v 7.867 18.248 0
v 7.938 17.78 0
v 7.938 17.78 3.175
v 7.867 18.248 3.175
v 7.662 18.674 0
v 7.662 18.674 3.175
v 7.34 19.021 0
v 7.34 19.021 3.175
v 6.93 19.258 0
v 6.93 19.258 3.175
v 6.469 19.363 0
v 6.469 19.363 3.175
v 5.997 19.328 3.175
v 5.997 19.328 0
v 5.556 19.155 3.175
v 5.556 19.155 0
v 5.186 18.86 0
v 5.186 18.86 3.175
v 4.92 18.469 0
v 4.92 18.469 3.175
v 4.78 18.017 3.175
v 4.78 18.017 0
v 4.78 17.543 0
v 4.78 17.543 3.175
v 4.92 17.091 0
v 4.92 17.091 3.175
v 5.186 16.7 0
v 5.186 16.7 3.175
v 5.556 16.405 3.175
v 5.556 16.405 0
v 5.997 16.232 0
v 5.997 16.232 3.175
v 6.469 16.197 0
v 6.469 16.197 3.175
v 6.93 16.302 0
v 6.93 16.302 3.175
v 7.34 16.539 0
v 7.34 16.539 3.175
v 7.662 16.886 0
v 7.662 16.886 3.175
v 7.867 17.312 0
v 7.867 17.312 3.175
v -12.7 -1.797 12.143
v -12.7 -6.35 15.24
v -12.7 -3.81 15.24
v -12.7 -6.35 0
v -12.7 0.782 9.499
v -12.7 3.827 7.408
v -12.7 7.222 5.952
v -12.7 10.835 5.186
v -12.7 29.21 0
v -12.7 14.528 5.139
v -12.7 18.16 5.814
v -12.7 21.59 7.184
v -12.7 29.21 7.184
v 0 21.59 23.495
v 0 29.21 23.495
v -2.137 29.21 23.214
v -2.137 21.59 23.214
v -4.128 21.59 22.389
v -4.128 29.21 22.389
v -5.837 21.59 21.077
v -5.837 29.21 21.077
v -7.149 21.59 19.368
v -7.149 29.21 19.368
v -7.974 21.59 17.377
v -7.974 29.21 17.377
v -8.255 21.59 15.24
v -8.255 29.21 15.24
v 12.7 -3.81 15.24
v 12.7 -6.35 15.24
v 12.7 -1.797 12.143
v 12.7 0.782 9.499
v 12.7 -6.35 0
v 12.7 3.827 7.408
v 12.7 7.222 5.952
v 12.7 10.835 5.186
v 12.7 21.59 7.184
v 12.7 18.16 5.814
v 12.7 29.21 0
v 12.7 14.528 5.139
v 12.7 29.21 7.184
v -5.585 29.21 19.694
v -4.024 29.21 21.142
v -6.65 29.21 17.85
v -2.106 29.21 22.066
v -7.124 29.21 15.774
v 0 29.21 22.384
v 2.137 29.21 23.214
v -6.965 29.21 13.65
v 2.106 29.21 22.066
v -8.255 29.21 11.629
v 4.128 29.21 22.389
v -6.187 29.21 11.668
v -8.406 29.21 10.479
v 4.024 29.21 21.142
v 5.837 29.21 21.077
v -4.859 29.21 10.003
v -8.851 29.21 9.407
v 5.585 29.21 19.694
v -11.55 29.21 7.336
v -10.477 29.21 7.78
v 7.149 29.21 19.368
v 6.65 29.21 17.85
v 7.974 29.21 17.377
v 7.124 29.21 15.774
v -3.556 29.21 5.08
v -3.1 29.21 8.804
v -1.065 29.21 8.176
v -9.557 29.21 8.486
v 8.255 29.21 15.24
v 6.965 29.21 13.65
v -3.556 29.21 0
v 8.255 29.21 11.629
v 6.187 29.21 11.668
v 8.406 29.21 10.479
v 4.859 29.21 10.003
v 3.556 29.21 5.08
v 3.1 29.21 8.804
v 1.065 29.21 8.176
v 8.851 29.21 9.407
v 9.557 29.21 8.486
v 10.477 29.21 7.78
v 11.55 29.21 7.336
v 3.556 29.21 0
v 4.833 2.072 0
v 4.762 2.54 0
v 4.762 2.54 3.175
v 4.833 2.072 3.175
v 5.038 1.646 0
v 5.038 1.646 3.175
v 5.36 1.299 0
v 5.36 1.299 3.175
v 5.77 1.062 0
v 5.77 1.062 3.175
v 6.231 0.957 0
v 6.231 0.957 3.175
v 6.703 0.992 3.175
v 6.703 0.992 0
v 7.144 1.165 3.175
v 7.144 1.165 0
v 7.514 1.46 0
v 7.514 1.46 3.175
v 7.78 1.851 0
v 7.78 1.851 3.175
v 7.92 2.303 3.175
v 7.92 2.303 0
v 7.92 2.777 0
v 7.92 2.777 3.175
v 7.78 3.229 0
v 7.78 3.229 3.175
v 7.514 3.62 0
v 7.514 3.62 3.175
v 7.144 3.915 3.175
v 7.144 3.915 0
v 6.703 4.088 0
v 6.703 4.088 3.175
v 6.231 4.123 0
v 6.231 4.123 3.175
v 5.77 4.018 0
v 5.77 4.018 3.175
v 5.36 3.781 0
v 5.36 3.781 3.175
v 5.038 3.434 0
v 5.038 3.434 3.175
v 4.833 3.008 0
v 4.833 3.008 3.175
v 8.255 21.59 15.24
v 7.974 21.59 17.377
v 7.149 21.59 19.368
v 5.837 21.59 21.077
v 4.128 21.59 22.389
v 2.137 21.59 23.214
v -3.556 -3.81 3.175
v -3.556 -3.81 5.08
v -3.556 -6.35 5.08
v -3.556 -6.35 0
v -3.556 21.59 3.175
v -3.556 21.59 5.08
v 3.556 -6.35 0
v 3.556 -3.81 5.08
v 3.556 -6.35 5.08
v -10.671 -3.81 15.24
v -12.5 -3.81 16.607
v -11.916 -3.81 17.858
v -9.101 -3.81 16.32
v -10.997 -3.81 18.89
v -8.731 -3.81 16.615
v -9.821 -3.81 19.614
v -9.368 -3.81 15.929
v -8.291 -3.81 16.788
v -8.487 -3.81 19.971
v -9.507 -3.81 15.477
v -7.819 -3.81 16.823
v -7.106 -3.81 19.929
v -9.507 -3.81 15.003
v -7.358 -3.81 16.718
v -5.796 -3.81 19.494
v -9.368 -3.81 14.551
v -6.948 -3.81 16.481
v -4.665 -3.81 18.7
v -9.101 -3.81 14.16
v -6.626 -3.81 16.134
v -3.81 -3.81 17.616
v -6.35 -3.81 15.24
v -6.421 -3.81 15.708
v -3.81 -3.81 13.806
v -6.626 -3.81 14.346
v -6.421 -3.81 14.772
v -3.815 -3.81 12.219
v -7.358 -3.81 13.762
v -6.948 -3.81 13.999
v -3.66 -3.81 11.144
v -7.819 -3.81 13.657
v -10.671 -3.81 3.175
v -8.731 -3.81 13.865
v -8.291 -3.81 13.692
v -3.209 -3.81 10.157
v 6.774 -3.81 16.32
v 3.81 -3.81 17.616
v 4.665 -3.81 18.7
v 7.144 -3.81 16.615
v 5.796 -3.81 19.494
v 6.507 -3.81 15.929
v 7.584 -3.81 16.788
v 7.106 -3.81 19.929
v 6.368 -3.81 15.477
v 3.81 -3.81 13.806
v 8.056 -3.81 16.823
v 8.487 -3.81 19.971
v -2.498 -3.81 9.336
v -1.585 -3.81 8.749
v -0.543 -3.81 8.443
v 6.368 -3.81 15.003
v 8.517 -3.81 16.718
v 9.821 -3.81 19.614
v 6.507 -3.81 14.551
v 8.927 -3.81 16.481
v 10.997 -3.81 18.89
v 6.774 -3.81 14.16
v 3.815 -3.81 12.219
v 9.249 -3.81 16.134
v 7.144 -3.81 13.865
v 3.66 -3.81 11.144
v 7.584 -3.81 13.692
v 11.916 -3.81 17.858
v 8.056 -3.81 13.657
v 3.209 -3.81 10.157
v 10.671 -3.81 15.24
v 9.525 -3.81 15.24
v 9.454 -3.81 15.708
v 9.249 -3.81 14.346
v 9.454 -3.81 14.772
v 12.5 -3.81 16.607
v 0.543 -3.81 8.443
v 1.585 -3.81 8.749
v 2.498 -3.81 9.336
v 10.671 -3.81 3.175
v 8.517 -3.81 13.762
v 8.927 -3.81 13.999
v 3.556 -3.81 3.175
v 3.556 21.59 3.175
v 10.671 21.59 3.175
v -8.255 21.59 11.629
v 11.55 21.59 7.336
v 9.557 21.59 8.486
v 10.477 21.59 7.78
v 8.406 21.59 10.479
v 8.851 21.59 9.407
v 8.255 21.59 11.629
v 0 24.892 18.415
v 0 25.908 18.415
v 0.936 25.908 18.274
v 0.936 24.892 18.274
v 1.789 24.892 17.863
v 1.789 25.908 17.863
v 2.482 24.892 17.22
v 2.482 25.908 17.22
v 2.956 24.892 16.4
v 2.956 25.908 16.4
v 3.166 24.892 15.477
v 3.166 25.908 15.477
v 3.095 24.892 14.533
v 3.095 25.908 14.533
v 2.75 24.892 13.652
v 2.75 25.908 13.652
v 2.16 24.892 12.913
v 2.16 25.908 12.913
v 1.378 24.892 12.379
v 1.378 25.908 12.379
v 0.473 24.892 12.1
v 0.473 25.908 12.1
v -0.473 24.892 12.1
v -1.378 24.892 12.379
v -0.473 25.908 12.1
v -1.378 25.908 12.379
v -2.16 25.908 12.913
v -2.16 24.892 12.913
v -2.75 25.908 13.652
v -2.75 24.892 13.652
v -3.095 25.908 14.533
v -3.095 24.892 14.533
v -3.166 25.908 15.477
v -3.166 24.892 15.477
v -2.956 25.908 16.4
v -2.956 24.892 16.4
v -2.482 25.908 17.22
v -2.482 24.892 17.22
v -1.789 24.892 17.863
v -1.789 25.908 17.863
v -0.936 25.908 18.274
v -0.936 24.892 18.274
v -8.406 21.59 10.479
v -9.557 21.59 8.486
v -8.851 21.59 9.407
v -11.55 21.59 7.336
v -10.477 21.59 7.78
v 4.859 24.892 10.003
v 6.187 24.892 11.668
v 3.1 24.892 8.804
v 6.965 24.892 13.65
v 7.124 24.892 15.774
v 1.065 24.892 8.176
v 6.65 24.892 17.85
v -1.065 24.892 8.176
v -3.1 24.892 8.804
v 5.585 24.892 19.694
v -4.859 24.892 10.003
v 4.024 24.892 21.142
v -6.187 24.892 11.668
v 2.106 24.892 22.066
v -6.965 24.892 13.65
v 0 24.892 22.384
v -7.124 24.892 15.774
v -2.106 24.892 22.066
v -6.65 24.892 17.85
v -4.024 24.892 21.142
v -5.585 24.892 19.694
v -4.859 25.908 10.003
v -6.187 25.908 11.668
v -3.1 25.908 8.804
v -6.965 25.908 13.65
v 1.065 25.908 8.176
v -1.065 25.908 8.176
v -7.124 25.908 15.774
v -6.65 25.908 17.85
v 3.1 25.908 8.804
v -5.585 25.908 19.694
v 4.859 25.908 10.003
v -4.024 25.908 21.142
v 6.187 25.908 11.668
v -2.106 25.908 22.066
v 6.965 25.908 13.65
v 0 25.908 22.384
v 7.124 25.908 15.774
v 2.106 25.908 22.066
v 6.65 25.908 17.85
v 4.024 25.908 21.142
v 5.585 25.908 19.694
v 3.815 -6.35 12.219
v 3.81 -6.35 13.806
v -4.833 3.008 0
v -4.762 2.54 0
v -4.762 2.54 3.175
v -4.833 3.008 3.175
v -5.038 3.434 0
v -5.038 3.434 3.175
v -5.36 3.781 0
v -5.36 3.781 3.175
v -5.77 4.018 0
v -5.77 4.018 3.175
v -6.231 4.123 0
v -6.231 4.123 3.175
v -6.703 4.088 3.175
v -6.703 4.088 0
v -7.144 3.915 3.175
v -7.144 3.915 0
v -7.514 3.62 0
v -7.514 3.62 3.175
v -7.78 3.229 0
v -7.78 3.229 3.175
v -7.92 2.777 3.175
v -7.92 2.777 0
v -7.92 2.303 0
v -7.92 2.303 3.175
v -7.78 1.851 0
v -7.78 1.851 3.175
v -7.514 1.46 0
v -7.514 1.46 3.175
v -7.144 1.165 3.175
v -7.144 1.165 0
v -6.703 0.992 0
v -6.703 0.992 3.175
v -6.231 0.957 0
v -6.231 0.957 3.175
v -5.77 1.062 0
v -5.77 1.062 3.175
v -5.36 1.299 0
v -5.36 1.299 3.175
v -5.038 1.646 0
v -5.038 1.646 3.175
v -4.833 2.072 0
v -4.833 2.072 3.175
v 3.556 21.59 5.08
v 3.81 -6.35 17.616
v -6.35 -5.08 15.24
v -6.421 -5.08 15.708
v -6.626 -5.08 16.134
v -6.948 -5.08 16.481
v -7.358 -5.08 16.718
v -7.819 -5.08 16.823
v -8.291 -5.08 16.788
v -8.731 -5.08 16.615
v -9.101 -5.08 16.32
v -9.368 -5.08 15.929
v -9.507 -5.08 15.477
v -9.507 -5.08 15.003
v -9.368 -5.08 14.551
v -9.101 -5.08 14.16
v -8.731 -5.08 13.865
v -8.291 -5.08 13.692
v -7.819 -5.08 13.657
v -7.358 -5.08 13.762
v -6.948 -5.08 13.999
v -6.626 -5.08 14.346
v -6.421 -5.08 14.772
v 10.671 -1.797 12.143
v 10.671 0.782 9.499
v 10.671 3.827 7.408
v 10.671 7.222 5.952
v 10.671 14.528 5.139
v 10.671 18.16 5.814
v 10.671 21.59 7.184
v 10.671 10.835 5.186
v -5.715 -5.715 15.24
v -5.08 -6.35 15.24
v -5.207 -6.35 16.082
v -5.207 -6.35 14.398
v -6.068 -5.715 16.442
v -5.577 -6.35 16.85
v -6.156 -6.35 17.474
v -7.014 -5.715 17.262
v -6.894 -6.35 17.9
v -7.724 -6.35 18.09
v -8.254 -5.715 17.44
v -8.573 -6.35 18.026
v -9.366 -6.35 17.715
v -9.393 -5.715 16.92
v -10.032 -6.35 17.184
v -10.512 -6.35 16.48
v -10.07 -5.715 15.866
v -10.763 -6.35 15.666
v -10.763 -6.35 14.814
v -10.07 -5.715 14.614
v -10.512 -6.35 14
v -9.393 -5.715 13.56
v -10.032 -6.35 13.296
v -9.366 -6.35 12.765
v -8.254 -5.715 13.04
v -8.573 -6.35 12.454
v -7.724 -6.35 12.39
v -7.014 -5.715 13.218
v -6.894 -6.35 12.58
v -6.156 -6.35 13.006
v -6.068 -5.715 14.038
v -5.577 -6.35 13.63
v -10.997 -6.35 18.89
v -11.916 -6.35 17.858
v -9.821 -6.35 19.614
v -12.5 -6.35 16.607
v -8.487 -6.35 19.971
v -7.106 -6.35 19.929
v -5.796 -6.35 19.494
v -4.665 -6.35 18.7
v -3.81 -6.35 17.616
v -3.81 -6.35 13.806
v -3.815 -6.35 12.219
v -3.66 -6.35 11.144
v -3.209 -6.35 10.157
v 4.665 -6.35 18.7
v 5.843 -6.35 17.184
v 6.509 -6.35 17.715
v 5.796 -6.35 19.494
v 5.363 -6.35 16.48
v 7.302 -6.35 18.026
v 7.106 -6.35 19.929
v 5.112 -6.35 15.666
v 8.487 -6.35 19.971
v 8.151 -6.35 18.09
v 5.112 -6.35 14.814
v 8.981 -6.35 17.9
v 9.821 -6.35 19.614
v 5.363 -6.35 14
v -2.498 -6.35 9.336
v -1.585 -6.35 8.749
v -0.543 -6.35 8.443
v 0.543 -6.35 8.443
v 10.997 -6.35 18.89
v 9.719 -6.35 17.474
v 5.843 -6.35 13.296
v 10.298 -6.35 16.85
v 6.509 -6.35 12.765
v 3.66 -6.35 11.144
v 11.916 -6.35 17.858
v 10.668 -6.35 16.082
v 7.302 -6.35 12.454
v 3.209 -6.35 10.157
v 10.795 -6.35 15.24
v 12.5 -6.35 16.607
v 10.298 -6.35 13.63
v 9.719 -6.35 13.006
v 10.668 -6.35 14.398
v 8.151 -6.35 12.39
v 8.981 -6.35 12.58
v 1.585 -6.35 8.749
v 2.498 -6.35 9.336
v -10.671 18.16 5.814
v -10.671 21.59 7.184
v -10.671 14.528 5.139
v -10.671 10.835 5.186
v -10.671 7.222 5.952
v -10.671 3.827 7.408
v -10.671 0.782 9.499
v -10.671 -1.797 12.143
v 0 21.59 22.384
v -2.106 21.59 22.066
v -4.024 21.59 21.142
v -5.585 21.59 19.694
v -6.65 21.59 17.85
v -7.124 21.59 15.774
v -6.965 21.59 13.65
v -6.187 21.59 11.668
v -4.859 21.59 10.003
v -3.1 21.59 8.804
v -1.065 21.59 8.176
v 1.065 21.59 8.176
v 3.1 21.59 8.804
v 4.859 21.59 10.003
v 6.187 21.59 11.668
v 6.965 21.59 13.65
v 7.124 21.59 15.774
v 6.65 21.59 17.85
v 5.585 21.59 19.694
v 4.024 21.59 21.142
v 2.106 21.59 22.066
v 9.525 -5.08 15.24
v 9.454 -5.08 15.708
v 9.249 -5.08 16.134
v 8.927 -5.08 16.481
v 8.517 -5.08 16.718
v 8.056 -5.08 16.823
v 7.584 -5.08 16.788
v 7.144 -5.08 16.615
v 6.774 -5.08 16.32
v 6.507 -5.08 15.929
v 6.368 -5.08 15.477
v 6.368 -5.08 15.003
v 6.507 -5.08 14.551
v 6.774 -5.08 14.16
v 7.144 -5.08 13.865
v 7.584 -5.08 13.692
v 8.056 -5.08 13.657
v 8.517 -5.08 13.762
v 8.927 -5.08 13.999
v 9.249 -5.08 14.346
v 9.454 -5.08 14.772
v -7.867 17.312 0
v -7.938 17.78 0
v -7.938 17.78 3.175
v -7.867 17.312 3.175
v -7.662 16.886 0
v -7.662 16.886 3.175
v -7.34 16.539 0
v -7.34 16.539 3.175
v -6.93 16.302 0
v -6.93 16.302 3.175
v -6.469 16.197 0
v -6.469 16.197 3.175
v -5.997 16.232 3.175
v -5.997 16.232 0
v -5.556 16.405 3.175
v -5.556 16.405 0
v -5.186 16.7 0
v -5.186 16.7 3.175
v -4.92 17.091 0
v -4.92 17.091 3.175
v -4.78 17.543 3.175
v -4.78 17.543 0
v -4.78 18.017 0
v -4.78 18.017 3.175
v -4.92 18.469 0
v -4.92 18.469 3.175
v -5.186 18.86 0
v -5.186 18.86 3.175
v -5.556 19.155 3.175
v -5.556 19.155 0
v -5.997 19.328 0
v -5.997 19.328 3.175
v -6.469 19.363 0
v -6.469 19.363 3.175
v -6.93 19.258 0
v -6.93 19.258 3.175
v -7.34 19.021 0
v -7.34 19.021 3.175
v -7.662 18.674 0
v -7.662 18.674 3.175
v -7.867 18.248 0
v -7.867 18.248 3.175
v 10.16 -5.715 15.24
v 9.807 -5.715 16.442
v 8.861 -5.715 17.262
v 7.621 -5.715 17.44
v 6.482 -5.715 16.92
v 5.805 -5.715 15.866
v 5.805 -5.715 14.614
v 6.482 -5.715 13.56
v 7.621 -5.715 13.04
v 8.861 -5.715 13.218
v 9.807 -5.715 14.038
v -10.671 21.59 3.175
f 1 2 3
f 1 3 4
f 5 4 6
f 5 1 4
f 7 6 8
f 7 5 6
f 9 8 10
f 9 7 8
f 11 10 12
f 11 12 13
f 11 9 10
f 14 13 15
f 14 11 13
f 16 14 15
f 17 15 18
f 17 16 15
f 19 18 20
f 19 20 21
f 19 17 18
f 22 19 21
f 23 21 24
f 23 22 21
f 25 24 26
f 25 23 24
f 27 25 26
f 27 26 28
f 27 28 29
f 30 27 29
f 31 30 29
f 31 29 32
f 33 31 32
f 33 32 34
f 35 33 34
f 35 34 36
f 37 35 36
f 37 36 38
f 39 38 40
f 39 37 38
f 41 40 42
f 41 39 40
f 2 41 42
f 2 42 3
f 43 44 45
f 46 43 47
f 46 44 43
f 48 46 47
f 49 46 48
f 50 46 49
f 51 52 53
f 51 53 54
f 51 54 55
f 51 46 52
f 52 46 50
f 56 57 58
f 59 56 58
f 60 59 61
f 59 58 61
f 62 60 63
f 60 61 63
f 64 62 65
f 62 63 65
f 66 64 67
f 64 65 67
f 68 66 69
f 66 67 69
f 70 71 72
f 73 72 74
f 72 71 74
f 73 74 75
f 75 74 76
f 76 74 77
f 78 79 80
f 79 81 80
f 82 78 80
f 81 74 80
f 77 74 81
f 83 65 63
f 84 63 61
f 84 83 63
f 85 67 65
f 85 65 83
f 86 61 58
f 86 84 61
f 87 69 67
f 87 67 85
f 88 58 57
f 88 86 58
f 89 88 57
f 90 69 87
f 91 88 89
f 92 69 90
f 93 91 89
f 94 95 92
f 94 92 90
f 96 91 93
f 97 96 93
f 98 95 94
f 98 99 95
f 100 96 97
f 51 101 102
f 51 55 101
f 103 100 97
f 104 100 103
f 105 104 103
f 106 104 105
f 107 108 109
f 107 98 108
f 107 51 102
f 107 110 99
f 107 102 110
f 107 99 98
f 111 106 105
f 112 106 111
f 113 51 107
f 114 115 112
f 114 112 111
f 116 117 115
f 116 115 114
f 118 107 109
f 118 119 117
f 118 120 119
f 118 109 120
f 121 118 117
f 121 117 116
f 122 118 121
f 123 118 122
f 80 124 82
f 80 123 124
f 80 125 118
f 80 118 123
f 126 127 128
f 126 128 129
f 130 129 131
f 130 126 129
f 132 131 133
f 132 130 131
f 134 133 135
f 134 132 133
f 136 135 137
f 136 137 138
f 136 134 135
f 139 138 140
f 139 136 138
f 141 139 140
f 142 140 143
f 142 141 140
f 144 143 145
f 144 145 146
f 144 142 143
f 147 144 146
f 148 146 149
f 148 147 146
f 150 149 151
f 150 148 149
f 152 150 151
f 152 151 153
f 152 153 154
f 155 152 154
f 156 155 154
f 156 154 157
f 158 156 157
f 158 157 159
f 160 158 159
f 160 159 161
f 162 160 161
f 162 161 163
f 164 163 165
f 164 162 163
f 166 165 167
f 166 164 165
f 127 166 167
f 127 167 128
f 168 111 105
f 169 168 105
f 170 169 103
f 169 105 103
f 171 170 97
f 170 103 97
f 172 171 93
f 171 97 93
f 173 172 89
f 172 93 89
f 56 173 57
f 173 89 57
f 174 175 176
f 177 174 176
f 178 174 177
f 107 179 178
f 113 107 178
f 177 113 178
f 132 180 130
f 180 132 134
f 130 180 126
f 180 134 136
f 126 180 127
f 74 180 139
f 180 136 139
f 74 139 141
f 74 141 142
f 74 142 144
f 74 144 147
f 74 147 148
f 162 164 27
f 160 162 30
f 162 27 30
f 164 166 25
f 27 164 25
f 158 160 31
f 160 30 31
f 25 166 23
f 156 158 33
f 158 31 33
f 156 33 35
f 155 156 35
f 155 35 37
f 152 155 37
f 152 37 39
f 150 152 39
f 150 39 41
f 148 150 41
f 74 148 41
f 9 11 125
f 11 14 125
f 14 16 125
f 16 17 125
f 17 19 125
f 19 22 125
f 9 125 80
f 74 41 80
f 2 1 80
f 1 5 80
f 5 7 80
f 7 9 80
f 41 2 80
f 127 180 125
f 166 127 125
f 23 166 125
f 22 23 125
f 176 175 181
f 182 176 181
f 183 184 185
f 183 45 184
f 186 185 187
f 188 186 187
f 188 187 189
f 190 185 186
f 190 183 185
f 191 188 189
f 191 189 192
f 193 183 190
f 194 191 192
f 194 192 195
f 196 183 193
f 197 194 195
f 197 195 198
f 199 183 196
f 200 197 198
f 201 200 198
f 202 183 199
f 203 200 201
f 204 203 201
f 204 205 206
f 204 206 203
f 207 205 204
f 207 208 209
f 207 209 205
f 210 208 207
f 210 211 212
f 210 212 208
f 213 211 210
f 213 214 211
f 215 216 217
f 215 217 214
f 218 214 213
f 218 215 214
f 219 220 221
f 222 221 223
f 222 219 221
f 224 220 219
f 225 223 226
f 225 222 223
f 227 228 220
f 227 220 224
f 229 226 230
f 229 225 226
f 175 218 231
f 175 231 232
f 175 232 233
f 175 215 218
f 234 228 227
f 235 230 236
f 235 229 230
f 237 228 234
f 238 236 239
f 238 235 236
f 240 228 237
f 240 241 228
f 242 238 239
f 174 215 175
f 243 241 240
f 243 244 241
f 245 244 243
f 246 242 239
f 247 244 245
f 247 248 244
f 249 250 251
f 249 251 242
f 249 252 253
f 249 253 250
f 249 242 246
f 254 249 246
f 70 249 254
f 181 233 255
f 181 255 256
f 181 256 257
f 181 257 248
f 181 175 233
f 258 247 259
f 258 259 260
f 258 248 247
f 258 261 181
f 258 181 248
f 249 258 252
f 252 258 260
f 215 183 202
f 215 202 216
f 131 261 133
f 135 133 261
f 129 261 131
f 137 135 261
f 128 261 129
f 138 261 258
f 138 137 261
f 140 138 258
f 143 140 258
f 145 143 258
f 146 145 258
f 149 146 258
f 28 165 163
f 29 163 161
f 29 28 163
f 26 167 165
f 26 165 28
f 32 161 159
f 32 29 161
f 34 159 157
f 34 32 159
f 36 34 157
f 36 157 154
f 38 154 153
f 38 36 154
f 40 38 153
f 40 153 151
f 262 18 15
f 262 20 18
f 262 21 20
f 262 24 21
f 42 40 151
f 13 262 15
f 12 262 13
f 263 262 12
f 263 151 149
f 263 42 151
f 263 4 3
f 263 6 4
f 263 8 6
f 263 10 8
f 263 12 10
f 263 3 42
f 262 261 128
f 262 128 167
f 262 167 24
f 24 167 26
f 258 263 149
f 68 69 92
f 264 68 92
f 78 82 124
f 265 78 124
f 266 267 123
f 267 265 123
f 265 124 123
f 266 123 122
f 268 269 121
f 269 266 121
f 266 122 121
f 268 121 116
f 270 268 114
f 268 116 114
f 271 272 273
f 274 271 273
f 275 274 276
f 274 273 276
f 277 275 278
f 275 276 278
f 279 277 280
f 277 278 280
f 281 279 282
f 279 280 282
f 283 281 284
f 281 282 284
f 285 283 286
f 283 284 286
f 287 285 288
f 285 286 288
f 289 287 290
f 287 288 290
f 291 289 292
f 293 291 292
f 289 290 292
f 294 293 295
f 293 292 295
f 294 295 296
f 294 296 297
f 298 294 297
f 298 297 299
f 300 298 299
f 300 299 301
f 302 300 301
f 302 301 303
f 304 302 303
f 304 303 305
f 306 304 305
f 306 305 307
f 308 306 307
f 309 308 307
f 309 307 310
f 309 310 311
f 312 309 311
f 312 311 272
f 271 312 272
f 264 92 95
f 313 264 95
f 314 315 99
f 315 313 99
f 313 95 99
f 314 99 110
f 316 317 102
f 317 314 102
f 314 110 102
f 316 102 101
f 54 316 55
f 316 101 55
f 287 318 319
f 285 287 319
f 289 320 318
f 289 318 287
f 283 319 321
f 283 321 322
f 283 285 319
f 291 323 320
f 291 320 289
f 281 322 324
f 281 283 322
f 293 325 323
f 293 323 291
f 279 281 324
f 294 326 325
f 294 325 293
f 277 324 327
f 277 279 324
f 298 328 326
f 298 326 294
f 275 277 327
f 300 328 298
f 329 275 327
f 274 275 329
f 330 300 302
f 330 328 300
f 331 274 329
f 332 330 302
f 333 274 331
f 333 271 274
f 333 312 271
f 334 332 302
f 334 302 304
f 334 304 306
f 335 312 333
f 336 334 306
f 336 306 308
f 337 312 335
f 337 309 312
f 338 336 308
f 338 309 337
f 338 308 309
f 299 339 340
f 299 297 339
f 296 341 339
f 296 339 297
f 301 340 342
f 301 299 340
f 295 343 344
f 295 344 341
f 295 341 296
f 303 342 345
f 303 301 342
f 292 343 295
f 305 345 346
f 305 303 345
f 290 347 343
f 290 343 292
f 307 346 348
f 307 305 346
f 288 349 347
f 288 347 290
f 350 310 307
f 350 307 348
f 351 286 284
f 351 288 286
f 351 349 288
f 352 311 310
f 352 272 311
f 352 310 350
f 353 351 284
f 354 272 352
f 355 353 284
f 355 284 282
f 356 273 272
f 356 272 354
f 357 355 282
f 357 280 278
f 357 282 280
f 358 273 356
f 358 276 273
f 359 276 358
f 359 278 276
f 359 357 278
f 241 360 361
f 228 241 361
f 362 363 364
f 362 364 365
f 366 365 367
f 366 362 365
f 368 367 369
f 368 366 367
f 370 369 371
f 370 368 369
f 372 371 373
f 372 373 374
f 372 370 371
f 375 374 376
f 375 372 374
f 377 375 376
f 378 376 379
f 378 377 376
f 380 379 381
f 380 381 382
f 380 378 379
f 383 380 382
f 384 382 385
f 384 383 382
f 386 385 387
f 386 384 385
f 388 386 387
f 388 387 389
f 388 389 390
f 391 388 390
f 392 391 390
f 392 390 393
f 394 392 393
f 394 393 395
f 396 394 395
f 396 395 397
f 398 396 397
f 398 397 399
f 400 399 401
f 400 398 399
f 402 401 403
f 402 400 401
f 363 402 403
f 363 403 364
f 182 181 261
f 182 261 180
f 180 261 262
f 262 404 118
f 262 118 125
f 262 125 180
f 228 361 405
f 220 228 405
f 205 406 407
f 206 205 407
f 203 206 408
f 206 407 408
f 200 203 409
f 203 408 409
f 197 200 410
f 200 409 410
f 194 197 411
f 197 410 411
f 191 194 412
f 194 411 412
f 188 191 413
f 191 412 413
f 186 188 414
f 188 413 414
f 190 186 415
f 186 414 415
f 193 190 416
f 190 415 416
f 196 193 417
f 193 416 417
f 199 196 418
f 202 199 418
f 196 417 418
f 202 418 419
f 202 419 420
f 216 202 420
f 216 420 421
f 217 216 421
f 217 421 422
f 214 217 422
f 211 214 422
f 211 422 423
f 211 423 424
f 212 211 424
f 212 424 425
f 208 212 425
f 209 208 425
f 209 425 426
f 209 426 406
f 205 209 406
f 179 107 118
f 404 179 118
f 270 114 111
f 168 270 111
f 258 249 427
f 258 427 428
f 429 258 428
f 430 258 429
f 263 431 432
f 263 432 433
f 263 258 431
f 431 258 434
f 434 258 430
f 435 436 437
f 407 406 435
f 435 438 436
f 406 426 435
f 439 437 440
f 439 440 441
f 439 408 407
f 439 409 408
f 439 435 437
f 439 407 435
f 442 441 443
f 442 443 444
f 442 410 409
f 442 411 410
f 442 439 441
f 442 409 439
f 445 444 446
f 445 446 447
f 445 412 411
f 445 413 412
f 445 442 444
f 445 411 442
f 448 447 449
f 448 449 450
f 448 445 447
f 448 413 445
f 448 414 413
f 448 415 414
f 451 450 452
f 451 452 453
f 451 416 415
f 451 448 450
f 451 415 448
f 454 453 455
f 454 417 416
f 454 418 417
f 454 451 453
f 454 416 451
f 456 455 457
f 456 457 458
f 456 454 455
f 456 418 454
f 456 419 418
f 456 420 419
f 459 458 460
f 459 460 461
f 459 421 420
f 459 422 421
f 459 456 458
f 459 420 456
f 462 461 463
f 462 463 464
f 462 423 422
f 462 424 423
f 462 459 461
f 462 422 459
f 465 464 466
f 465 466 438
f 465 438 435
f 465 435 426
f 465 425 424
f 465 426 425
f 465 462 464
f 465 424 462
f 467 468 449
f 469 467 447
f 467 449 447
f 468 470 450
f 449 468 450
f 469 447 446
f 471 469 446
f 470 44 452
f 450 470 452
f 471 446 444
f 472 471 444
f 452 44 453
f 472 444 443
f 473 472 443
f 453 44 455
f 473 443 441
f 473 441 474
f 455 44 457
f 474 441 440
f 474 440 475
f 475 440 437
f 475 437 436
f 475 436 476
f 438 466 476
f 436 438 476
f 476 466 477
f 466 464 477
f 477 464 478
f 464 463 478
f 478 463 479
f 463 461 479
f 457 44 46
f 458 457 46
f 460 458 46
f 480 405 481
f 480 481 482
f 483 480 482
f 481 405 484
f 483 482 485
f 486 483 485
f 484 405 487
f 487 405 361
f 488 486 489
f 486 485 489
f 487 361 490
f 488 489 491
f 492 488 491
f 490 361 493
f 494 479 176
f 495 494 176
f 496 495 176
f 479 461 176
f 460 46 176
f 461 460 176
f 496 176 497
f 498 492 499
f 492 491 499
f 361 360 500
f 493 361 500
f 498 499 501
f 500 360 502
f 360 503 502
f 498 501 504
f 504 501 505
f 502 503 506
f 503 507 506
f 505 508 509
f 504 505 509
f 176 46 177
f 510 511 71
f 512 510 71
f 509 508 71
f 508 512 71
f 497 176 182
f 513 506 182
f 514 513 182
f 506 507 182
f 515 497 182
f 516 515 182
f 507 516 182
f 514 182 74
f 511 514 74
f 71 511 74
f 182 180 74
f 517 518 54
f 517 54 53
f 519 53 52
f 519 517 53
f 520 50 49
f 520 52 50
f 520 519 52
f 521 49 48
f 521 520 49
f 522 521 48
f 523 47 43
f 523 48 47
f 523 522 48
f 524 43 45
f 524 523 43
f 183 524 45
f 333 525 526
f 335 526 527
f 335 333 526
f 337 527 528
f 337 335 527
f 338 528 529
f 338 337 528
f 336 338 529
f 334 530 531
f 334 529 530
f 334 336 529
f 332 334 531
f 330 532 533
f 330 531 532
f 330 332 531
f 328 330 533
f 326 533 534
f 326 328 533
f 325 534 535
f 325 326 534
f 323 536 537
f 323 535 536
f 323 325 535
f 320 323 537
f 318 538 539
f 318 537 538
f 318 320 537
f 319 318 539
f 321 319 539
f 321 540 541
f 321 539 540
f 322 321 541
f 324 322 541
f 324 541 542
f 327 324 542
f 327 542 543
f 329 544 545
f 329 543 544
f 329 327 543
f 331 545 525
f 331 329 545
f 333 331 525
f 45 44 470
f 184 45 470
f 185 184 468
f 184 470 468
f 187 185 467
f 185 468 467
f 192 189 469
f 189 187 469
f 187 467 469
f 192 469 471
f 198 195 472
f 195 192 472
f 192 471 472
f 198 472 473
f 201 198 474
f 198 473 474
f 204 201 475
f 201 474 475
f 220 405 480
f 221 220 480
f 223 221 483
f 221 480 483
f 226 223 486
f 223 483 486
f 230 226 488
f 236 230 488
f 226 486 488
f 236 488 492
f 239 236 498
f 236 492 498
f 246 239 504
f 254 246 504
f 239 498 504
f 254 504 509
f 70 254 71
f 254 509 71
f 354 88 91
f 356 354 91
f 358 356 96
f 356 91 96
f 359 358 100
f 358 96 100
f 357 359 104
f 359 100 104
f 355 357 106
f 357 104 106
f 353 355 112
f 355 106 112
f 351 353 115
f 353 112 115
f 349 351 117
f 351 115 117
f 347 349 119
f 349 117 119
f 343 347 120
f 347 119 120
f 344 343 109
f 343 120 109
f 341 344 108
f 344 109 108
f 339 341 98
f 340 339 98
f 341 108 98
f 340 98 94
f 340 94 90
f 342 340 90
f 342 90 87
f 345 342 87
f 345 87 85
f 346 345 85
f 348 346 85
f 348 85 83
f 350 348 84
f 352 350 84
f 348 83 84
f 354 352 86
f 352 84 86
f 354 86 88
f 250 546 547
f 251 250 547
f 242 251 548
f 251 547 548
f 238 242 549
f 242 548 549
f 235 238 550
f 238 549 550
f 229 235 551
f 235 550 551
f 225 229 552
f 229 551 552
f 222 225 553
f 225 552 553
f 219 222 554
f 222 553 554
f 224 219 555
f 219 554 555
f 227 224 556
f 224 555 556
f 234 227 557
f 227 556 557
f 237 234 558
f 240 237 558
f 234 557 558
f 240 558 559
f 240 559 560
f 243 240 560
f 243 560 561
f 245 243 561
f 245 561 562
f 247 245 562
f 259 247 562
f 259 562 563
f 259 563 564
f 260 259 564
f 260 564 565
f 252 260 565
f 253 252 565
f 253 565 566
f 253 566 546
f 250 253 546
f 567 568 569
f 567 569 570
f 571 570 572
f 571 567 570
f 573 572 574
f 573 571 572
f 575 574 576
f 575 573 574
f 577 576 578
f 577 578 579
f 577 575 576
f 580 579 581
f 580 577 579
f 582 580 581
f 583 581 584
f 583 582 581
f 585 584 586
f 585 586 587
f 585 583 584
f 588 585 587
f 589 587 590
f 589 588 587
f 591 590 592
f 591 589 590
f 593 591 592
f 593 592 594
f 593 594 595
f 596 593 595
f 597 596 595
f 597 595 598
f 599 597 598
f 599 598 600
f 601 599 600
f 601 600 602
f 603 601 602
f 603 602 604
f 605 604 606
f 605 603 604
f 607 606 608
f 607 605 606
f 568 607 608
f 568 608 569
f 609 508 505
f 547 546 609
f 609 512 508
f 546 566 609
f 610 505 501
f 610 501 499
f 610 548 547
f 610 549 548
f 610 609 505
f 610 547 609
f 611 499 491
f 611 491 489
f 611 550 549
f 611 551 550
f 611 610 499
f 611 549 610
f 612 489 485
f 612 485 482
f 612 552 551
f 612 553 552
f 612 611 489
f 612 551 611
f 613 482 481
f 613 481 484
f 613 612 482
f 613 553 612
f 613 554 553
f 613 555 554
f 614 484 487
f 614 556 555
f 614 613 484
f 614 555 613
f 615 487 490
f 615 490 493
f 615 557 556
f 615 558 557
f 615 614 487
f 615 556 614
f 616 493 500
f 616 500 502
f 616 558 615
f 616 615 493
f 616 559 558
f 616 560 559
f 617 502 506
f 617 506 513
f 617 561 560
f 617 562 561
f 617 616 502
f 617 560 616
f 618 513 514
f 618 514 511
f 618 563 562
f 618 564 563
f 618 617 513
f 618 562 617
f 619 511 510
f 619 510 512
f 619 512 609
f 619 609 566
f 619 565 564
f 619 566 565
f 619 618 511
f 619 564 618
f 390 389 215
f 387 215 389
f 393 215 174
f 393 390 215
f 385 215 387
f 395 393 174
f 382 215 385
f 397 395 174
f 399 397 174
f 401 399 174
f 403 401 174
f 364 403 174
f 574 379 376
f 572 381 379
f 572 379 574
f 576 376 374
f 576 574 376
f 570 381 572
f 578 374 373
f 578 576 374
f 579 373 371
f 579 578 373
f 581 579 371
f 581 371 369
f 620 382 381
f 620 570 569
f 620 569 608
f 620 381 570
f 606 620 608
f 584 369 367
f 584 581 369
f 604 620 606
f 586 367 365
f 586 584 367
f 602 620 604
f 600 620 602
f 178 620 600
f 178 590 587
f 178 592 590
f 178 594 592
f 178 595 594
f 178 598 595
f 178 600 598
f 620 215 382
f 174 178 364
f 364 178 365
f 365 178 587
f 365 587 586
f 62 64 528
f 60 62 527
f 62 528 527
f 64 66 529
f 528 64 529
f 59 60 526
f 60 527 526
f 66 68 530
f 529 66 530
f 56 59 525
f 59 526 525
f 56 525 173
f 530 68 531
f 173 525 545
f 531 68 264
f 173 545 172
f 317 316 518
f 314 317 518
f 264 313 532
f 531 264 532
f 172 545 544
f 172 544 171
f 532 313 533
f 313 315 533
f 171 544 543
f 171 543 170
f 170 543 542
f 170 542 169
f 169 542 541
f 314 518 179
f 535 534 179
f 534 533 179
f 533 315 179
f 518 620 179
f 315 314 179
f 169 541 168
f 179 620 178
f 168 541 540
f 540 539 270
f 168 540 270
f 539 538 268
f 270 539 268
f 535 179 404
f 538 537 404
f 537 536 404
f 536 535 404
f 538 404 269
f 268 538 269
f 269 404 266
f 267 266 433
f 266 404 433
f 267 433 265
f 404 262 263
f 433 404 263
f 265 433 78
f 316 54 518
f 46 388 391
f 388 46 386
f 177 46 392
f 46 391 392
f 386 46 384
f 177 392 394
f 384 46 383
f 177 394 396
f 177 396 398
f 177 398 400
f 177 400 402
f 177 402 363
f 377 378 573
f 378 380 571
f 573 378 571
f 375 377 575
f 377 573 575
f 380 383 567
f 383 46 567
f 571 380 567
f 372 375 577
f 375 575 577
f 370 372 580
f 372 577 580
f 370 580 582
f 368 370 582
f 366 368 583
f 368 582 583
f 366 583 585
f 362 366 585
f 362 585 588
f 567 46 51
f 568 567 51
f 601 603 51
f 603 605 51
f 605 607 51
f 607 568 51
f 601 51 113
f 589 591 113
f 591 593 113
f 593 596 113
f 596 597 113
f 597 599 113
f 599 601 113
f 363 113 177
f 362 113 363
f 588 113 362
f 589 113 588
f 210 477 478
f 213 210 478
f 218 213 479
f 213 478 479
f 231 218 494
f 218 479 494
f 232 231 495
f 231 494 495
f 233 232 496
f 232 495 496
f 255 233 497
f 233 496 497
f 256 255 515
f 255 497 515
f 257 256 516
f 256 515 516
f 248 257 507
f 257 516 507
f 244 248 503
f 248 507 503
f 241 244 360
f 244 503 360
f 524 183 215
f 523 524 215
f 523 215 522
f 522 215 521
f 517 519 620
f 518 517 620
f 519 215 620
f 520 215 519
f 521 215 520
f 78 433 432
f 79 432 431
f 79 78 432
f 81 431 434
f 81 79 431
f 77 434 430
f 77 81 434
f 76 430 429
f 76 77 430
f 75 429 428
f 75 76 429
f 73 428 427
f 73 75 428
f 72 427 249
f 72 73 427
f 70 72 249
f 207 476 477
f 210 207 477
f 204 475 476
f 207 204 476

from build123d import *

# Parameters (mm, degrees)
SKETCH1_W           = 25.4
SKETCH1_H           = 35.56
SKETCH1_R           = 1.5875
BOSS_EXTRUDE1_DEPTH = 3.175
SKETCH7_W           = 25.4
SKETCH7_H           = 2.54
SKETCH7_H_2         = 7.62
BOSS_EXTRUDE3_DEPTH = 20.32
SKETCH11_R          = 1.5875
CUT_EXTRUDE1_DEPTH  = 10
CHAMFER2_SIZE       = 1.27
SKETCH13_R          = 3.175
CUT_EXTRUDE2_DEPTH  = 12.7
SKETCH14_R          = 7.14375
CUT_EXTRUDE3_DEPTH  = 3.302
CUT_EXTRUDE4_START  = -3.302
SKETCH15_R          = 7.14375
CUT_EXTRUDE4_DEPTH  = 3.302
CUT_EXTRUDE5_DEPTH  = 12.7
SKETCH17_W          = 2.029010409
SKETCH17_H          = 25.4
BOSS_EXTRUDE4_DEPTH = 12.7
CUT_EXTRUDE6_DEPTH  = 46.281333074
SKETCH19_W          = 7.112
SKETCH19_H          = 5.08
CUT_EXTRUDE7_DEPTH  = 45.472672789


with BuildPart() as part:
    # Sketch1 → Boss-Extrude1 (new body)
    with BuildSketch(Plane.XY):
        with Locations((0, 11.43)):
            Rectangle(SKETCH1_W, SKETCH1_H)
        with Locations((-6.35, 2.54)):
            Circle(SKETCH1_R, mode=Mode.SUBTRACT)
        with Locations(Location((6.35, 2.54, 0), (0, 0, 180))):
            Circle(SKETCH1_R, mode=Mode.SUBTRACT)
        with Locations((6.35, 17.78)):
            Circle(SKETCH1_R, mode=Mode.SUBTRACT)
        with Locations(Location((-6.35, 17.78, 0), (0, 0, 180))):
            Circle(SKETCH1_R, mode=Mode.SUBTRACT)
    extrude(amount=BOSS_EXTRUDE1_DEPTH)

    # Sketch7 → Boss-Extrude3 (add)
    with BuildSketch(Plane.XY.offset(3.175)):
        with Locations((0, -5.08)):
            Rectangle(SKETCH7_W, SKETCH7_H)
        with Locations((0, 25.4)):
            Rectangle(SKETCH7_W, SKETCH7_H_2)
    extrude(amount=BOSS_EXTRUDE3_DEPTH)

    # Sketch11 → Cut-Extrude1 (cut)
    with BuildSketch(Plane.XZ.offset(6.35)):
        with BuildLine():
            Line((-3.81, 13.805952441), (-3.814692285, 12.218981082))
            ThreePointArc((-3.814692285, 12.218981082), (0, 8.404288797), (3.814692285, 12.218981082))
            Line((3.814692285, 12.218981082), (3.81, 13.805952441))
            Line((3.81, 13.805952441), (3.81, 17.615952441))
            ThreePointArc((3.81, 17.615952441), (9.167172212, 19.841012117), (12.7, 15.24))
            Line((12.7, 15.24), (12.7, 23.495))
            Line((12.7, 23.495), (-12.7, 23.495))
            Line((-12.7, 23.495), (-12.7, 15.24))
            ThreePointArc((-12.7, 15.24), (-9.167172212, 19.841012117), (-3.81, 17.615952441))
            Line((-3.81, 17.615952441), (-3.81, 13.805952441))
        make_face()
        with Locations((-7.9375, 15.24)):
            Circle(SKETCH11_R)
        with Locations((7.9375, 15.24)):
            Circle(SKETCH11_R)
    extrude(amount=-CUT_EXTRUDE1_DEPTH, mode=Mode.SUBTRACT)

    # Chamfer2
    chamfer2_edges = [part.edges().sort_by_distance(p)[0] for p in [
        (-9.525, -6.35, 15.24),
        (6.35, -6.35, 15.24),
    ]]
    chamfer(chamfer2_edges, length=CHAMFER2_SIZE)

    # Sketch13 → Cut-Extrude2 (cut)
    with BuildSketch(Plane(origin=(0, 29.21, 0), x_dir=(1, 0, 0), z_dir=(0, 1, 0))):
        with Locations(Location((0, -15.24, 0), (0, 0, 270))):
            Circle(SKETCH13_R)
    extrude(amount=-CUT_EXTRUDE2_DEPTH, mode=Mode.SUBTRACT)

    # Sketch14 → Cut-Extrude3 (cut)
    with BuildSketch(Plane(origin=(0, 29.21, 0), x_dir=(1, 0, 0), z_dir=(0, 1, 0))):
        with Locations(Location((0, -15.24, 0), (0, 0, 270))):
            Circle(SKETCH14_R)
    extrude(amount=-CUT_EXTRUDE3_DEPTH, mode=Mode.SUBTRACT)

    # Sketch15 → Cut-Extrude4 (cut)
    with BuildSketch(Plane.XZ.offset(-21.59).offset(CUT_EXTRUDE4_START)):
        with Locations(Location((0, 15.24, 0), (0, 0, 90))):
            Circle(SKETCH15_R)
    extrude(amount=CUT_EXTRUDE4_DEPTH, mode=Mode.SUBTRACT)

    # Sketch16 → Cut-Extrude5 (cut)
    with BuildSketch(Plane(origin=(0, 29.21, 0), x_dir=(1, 0, 0), z_dir=(0, 1, 0))):
        with BuildLine():
            ThreePointArc((8.255, -15.24), (5.837166479, -21.077166479), (0, -23.495))
            Line((0, -23.495), (12.7, -23.495))
            Line((12.7, -23.495), (12.7, -7.184415797))
            ThreePointArc((12.7, -7.184415797), (9.556910358, -8.486326154), (8.255, -11.629415797))
            Line((8.255, -11.629415797), (8.255, -15.24))
        make_face()
        with BuildLine():
            ThreePointArc((0, -23.495), (-5.837166479, -21.077166479), (-8.255, -15.24))
            Line((-8.255, -15.24), (-8.255, -11.629415797))
            ThreePointArc((-8.255, -11.629415797), (-9.556910358, -8.486326154), (-12.7, -7.184415797))
            Line((-12.7, -7.184415797), (-12.7, -23.495))
            Line((-12.7, -23.495), (0, -23.495))
        make_face()
    extrude(amount=-CUT_EXTRUDE5_DEPTH, mode=Mode.SUBTRACT)

    # Sketch17 → Boss-Extrude4 (add)
    with BuildSketch(Plane.XY.offset(3.175)):
        with Locations((-11.685494796, 8.89)):
            Rectangle(SKETCH17_W, SKETCH17_H)
        with Locations((11.685494796, 8.89)):
            Rectangle(SKETCH17_W, SKETCH17_H)
    extrude(amount=BOSS_EXTRUDE4_DEPTH)

    # Sketch18 → Cut-Extrude6 (cut, through all)
    with BuildSketch(Plane(origin=(12.7, 0, 0), x_dir=(0, 0, -1), z_dir=(1, 0, 0))):
        with BuildLine():
            ThreePointArc((-7.184415797, 21.59), (-5.951695656, 7.221633885), (-15.24, -3.81))
            Line((-15.24, -3.81), (-15.875, -3.81))
            Line((-15.875, -3.81), (-15.875, 21.59))
            Line((-15.875, 21.59), (-7.184415797, 21.59))
        make_face()
    extrude(amount=-CUT_EXTRUDE6_DEPTH, mode=Mode.SUBTRACT)

    # Sketch19 → Cut-Extrude7 (cut, through all)
    with BuildSketch(Plane(origin=(0, 29.21, 0), x_dir=(1, 0, 0), z_dir=(0, 1, 0))):
        with Locations((0, -2.54)):
            Rectangle(SKETCH19_W, SKETCH19_H)
    extrude(amount=-CUT_EXTRUDE7_DEPTH, mode=Mode.SUBTRACT)


solid = part.part
